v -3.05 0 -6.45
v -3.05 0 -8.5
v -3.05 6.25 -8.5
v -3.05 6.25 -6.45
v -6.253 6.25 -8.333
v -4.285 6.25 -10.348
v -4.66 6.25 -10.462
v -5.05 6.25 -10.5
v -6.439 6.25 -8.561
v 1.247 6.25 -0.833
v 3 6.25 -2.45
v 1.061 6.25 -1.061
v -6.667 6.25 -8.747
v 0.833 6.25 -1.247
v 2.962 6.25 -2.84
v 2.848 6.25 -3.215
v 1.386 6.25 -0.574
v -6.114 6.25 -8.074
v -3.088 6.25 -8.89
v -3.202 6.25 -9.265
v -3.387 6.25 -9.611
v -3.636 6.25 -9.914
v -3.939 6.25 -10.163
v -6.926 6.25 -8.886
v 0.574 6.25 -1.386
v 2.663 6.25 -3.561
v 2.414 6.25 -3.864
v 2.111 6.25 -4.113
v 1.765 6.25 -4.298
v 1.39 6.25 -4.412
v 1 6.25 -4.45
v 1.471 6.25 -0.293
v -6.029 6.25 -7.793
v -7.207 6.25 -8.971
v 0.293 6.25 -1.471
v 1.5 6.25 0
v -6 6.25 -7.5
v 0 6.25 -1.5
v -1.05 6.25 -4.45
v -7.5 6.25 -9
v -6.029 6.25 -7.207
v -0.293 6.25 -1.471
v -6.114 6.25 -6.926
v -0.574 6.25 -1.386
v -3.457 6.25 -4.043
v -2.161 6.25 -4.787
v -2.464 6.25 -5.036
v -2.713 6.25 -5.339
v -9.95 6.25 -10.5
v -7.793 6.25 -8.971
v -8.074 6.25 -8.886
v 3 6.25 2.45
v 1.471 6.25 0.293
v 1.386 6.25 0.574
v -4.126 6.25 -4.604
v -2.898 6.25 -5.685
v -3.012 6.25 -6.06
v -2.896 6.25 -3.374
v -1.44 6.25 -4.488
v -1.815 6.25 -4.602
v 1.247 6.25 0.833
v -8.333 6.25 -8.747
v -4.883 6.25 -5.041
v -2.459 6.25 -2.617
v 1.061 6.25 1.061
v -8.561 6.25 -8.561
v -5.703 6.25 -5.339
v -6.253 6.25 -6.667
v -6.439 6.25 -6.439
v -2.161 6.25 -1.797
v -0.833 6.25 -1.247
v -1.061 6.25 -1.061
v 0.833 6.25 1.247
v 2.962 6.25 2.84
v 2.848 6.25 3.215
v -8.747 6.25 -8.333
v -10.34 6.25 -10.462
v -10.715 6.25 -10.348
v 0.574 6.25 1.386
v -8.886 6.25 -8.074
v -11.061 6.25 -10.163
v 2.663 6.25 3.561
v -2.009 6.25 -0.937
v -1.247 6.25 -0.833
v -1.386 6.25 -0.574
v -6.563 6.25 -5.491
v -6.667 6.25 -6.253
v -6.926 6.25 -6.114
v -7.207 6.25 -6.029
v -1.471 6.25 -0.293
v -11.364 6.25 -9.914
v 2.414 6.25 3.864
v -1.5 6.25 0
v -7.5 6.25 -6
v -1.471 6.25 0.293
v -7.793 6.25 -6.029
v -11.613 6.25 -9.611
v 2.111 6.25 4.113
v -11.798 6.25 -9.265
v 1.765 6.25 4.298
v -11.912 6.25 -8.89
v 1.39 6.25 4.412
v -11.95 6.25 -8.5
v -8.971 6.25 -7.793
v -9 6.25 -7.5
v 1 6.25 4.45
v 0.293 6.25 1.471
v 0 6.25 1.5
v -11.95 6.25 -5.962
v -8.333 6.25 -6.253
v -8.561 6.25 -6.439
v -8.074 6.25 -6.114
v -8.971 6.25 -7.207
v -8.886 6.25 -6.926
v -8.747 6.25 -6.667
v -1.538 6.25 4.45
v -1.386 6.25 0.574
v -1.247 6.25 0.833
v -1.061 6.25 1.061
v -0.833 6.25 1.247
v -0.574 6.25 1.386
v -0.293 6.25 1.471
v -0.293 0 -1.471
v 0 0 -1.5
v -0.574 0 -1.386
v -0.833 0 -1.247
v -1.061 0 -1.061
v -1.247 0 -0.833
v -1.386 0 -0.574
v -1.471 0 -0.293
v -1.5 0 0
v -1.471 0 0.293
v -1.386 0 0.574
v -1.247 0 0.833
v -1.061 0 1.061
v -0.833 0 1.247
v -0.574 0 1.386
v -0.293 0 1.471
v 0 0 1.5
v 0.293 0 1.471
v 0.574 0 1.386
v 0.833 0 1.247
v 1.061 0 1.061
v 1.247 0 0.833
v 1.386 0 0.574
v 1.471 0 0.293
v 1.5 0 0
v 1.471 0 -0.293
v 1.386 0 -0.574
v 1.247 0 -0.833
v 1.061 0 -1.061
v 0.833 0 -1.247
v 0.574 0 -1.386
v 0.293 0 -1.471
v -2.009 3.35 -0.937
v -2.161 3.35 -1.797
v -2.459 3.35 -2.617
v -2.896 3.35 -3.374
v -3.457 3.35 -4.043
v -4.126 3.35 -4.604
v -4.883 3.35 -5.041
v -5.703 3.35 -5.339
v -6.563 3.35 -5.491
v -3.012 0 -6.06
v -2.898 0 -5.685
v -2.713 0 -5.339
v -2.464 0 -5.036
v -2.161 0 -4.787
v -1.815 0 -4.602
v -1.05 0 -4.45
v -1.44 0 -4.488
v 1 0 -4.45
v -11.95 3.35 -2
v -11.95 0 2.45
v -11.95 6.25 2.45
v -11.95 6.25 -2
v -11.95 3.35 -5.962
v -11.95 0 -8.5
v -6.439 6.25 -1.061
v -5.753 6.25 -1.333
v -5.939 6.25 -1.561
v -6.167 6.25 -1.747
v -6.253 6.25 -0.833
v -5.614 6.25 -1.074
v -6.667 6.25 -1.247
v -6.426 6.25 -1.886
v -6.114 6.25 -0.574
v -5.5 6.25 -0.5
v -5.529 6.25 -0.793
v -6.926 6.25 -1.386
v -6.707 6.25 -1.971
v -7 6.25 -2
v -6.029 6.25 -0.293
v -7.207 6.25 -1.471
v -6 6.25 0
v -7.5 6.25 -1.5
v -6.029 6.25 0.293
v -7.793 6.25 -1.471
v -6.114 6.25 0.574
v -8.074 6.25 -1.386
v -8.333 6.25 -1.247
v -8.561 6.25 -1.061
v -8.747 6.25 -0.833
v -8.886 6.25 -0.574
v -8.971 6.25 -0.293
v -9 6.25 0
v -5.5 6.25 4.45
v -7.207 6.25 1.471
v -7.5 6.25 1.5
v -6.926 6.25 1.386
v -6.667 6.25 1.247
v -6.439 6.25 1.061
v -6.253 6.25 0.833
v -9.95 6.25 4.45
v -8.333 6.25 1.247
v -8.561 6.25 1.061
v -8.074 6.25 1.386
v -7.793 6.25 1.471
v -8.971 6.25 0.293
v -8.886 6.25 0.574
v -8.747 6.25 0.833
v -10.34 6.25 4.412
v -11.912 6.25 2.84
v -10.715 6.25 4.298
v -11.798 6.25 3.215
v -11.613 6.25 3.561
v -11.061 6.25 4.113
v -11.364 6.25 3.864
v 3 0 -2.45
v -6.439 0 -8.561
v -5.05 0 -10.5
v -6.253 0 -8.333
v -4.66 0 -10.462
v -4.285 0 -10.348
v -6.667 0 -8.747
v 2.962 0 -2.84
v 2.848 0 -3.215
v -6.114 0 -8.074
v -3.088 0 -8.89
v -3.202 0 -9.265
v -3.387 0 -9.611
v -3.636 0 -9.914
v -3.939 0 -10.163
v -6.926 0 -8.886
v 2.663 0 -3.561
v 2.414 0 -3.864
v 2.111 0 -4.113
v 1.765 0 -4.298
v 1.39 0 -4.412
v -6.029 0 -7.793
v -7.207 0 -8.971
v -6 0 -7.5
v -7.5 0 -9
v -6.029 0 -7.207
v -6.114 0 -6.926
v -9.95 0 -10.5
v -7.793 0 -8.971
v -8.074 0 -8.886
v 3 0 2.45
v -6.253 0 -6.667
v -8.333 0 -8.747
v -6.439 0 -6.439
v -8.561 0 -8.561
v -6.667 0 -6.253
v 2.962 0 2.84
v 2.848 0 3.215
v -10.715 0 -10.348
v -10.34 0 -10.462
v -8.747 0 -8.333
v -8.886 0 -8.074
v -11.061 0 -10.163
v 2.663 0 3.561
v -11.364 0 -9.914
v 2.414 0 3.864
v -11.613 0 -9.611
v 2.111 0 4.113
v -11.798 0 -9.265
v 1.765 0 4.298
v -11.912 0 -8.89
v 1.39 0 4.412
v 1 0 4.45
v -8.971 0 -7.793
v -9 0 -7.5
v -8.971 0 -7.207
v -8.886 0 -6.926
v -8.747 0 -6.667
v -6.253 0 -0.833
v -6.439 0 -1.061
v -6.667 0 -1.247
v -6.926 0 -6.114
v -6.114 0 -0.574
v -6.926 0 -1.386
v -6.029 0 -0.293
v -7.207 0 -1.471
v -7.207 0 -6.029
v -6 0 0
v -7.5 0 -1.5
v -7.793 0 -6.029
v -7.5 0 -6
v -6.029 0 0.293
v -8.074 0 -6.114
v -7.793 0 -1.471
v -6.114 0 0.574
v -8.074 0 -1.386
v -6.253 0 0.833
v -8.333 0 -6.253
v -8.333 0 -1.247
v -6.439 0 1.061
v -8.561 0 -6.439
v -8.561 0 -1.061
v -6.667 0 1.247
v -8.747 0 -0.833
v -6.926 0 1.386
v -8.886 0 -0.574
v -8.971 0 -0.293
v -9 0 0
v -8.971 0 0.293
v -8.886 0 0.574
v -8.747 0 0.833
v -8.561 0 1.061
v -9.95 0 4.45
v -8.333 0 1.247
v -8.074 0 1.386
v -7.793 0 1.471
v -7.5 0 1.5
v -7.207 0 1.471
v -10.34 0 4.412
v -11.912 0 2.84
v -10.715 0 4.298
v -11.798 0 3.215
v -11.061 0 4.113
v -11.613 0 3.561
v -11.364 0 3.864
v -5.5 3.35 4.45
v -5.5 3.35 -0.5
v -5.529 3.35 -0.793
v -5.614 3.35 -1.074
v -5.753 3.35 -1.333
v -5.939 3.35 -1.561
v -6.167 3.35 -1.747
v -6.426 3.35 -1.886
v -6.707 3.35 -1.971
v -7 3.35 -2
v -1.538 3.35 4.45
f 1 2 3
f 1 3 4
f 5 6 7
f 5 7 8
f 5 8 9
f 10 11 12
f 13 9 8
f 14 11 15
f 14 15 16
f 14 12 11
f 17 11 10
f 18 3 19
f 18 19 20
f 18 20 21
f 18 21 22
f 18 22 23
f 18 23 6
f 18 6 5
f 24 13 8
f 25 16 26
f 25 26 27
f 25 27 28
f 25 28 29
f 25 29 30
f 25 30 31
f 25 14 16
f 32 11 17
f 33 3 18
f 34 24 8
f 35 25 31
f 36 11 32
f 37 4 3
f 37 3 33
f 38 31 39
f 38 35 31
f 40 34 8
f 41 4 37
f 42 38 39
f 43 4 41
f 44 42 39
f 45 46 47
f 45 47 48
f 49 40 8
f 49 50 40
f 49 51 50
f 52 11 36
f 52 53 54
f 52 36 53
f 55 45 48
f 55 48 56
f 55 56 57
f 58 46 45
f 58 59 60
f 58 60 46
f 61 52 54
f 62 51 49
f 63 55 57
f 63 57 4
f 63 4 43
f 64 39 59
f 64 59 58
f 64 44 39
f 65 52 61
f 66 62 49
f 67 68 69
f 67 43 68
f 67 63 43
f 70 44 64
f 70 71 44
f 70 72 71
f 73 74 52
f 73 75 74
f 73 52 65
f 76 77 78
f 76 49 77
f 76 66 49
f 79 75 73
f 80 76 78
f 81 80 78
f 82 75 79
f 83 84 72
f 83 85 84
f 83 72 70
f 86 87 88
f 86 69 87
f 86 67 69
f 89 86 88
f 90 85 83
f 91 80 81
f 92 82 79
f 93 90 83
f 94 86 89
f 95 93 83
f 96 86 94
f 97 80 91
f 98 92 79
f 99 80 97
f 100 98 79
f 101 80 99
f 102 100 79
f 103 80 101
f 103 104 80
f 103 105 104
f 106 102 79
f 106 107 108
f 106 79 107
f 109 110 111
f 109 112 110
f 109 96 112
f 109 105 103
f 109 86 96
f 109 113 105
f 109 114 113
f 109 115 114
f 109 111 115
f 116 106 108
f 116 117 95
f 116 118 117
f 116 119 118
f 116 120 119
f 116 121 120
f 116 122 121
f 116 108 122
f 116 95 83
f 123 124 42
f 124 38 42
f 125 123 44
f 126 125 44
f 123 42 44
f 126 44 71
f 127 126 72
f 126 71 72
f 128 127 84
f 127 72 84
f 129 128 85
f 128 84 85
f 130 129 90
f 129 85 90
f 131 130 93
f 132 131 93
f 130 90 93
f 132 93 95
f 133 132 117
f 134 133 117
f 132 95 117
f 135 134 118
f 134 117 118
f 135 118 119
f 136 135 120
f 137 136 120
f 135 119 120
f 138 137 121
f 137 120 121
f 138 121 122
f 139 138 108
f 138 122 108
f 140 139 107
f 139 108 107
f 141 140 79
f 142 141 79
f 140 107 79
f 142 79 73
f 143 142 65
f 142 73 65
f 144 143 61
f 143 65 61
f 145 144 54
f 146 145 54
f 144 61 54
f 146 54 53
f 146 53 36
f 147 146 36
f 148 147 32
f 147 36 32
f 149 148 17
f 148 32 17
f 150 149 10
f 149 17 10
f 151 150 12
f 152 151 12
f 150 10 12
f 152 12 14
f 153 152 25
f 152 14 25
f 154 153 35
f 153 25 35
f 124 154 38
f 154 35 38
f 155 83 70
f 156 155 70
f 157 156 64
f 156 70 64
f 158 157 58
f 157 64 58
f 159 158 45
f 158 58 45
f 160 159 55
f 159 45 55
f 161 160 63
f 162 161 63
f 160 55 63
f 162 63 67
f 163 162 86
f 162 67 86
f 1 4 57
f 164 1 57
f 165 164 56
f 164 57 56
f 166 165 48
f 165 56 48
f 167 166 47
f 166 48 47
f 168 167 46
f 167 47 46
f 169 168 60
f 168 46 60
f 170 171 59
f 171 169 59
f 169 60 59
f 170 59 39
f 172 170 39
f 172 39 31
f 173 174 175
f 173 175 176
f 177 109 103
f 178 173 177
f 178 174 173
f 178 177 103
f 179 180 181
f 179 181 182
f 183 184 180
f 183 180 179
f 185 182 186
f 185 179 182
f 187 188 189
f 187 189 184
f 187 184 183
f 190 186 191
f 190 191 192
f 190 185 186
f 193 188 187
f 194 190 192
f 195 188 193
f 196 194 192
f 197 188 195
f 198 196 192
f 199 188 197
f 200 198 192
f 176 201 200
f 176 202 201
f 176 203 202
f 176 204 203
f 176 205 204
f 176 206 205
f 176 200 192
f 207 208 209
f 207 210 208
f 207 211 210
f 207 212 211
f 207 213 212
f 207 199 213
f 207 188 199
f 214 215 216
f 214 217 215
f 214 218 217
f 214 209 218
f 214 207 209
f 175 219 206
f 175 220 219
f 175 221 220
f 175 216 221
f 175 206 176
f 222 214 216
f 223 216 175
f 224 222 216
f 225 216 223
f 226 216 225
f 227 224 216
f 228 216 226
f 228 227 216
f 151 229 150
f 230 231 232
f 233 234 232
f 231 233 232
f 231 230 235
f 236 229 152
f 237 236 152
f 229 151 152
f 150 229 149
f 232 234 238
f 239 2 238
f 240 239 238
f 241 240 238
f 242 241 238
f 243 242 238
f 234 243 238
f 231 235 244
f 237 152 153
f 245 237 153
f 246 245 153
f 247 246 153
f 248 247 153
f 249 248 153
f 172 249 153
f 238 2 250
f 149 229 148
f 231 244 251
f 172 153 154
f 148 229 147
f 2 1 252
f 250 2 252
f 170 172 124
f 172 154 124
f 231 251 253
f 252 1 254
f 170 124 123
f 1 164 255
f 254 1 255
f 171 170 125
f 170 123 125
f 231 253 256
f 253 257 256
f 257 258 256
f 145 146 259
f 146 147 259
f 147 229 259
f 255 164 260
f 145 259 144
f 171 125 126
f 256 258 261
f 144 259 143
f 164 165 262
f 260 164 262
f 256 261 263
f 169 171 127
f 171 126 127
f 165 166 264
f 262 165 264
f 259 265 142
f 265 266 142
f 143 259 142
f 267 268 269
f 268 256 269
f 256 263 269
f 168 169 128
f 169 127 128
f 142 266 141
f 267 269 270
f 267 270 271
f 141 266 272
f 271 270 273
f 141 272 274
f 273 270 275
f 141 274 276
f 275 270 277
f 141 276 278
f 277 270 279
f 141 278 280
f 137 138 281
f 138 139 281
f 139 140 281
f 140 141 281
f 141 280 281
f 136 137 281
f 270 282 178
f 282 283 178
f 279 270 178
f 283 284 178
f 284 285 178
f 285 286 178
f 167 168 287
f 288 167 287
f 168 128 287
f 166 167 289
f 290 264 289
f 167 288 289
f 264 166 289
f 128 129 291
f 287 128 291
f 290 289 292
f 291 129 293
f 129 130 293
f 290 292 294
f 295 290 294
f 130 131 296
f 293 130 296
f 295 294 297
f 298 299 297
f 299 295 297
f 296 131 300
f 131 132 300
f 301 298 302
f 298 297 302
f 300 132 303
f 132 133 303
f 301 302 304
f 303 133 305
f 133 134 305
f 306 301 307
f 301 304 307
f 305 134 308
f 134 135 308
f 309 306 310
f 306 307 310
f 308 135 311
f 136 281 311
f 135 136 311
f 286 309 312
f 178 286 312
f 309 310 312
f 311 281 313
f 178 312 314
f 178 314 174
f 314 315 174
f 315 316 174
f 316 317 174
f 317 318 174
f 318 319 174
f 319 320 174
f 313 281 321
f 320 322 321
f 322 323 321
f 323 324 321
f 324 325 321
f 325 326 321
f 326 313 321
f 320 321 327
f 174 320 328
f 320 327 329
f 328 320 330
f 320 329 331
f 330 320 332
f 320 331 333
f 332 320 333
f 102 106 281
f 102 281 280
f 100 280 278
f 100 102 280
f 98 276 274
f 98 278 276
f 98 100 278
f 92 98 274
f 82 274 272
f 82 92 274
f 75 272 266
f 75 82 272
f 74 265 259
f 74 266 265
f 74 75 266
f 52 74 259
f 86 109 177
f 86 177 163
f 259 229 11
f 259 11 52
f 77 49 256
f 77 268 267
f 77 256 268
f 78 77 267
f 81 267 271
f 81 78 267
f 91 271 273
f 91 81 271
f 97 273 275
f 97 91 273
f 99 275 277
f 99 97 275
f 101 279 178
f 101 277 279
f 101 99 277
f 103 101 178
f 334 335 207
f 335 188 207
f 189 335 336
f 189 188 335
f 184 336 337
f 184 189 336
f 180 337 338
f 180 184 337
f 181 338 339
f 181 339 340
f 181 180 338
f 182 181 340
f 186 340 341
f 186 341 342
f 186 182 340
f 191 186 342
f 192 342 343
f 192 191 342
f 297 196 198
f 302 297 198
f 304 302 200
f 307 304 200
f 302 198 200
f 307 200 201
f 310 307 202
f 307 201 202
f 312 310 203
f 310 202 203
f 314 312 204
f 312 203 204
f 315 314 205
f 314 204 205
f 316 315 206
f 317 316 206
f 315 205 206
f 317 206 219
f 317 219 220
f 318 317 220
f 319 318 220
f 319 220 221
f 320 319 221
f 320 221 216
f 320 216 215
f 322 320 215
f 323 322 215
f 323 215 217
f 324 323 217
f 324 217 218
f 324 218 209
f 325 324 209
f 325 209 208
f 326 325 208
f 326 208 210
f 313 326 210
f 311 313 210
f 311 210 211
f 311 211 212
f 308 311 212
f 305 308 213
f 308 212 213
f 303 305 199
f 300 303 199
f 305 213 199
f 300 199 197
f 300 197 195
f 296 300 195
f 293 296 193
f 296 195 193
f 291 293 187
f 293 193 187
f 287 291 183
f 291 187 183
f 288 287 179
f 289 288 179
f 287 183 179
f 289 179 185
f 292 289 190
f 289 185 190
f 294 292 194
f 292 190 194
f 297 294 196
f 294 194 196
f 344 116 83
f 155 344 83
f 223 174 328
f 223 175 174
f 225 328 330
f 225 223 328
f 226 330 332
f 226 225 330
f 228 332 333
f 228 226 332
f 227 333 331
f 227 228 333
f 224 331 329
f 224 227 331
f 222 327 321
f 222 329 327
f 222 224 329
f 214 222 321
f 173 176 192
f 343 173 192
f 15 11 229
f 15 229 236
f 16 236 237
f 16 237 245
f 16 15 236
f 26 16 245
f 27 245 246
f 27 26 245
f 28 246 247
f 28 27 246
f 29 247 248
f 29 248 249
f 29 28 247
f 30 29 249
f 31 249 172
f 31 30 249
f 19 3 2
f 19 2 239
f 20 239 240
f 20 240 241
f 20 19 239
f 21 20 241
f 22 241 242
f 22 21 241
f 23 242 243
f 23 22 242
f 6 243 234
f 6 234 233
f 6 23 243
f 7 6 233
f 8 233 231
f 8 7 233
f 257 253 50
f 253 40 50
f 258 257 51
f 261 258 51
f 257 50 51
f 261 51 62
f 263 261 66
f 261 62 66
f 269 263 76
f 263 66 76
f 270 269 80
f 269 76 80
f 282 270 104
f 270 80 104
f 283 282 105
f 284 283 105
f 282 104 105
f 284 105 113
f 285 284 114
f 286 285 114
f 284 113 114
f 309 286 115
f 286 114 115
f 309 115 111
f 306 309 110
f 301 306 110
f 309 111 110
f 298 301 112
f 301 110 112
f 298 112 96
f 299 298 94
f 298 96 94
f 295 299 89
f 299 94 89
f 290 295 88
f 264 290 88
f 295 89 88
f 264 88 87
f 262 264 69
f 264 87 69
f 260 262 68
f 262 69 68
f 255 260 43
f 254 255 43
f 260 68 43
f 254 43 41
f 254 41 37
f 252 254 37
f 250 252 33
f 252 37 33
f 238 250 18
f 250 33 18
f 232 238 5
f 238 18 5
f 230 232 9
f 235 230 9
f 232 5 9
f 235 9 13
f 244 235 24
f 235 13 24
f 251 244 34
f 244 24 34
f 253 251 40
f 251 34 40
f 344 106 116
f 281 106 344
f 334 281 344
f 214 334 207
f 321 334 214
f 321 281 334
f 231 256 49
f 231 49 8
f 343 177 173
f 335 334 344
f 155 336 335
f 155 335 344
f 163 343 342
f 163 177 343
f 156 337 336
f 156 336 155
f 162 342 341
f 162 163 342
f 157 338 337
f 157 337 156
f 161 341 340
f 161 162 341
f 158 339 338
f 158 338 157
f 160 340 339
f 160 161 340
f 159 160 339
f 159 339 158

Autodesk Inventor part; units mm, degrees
ref_plane "YZ Plane" through (0, 0, 0) normal (1, 0, 0) x (0, 1, 0)
ref_plane "XZ Plane" through (0, 0, 0) normal (0, 1, 0) x (-1, 0, 0)
ref_plane "XY Plane" through (0, 0, 0) normal (0, 0, 1) x (1, 0, 0)
sketch "Sketch1" plane through (0, 0, 0) normal (0, 1, 0) x (-1, 0, 0)
  line L0 (0, 0) -> (7.5, 0) construction
  line L1 (7.5, 0) -> (7.5, -7.5) construction
  line L2 (0, 0) -> (-3, 0) construction
  line L3 (-3, -4.45) -> (-3, 4.45)
  line L4 (-3, 4.45) -> (11.95, 4.45)
  line L5 (11.95, 4.45) -> (11.95, -10.5)
  line L6 (11.95, -10.5) -> (3.05, -10.5)
  line L7 (3.05, -10.5) -> (3.05, -4.45)
  line L8 (3.05, -4.45) -> (-3, -4.45)
  line L9 (7.5, -7.5) -> (7.5, -10.5) construction
  dimension "d0" = 7.5
  dimension "d1" = 7.5
  dimension "d2" = 8.9
  dimension "d3" = 3
extrude "Extrusion1" add sketch "Sketch1" along normal blind 6.25
hole "Hole1" at (0, 0, 0) at (-7.5, 0, 0) at (-7.5, 0, -7.5) direction (0, 1, 0) diameter 3 end through all
sketch "Sketch2" plane through (0, 6.25, 0) normal (0, 1, 0) x (1, 0, 0)
  circle A0 centre (-7.5, 0) radius 1.5 projected
  circle A1 centre (0, 0) radius 1.5 construction
  circle A2 centre (-7.5, 7.5) radius 1.5 projected
  line L0 (3, -4.45) -> (3, 4.45) construction
  line L1 (3, 4.45) -> (-3.05, 4.45) construction
  line L2 (-3.05, 4.45) -> (-3.05, 10.5) construction
  line L3 (-3.05, 10.5) -> (-11.95, 10.5) construction
  line L4 (-11.95, 10.5) -> (-11.95, -4.45) construction
  line L5 (-11.95, -4.45) -> (3, -4.45) construction
  line L6 (-11.95, -4.45) -> (-11.95, 10.5) projected
  line L7 (-11.95, 2) -> (-7, 2)
  line L8 (-5.5, 2) -> (-5.5, 0.5) construction
  line L9 (-11.95, -4.45) -> (3, -4.45) construction
  line L10 (-3.05, 4.45) -> (3, 4.45) construction
  line L11 (-7.5, 0) -> (-7.5, 2) construction
  line L12 (-7.5, 0) -> (-5.5, 0) construction
  line L13 (-3.05, 4.45) -> (-3.05, 10.5) construction
  line L14 (-3.05, 10.5) -> (-3.05, 4.45) construction
  line L15 (-1.5378, -4.45) -> (-5.5, -4.45)
  line L16 (-11.95, 2) -> (-11.95, 5.9622)
  line L17 (-11.95, 10.5) -> (-11.95, -4.45) projected
  line L18 (-11.95, 5.9622) -> (-6.5633, 5.4909)
  line L19 (-1.5378, -4.45) -> (-2.0091, 0.9367)
  circle A3 centre (-7, 0.5) radius 1.5
  line L20 (-7, 2) -> (-5.5, 2) construction
  line L21 (-5.5, 0.5) -> (-5.5, -4.45)
  arc A4 (-2.0091, 0.9367) -> (-6.5633, 5.4909) centre (-7, 0.5) ccw
  dimension "d14" = 2
  dimension "d18" = 5
  dimension "d19" = 5
  dimension "d21" = 3
  dimension "d22" = 5.01
extrude "MontageEnForce" cut sketch "Sketch2" against normal blind 2.9 contours L7 L6 L18 A4 L19 L15 L21 A3
fillet "Fillet1" radius 2 6 edges at (-3.05, 3.125, -4.45) (-11.95, 3.125, 4.45) (-3.05, 3.125, -10.5) (-11.95, 3.125, -10.5) (3, 3.125, 4.45) (3, 3.125, -4.45)
ref_plane "Work Plane1" through (0, 4.8, 0) normal (0, 1, 0) x (1, 0, 0)
sketch "Sketch4" plane through (0, 6.25, 0) normal (0, 1, 0) x (1, 0, 0)
  circle A0 centre (-7.5, 0) radius 1.5 projected
  circle A1 centre (-7.5, 7.5) radius 1.5 projected
  circle A2 centre (0, 0) radius 1.5 projected
ref_plane "Work Plane5" through (-7.5, 6.25, 0) normal (-1, 0, 0) x (0, 0, 1)
ref_plane "Work Plane6" through (0, 6.25, 0) normal (-1, 0, 0) x (0, 0, 1)
ref_plane "Work Plane7" through (-7.5, 6.25, 0) normal (0, 0, 1) x (1, 0, 0)
ref_plane "Work Plane8" through (-7.5, 6.25, -7.5) normal (0, 0, 1) x (1, 0, 0)
ref_plane "Work Plane2" through (-3.75, 6.25, 0) normal (-1, 0, 0) x (0, 0, 1)
ref_plane "Work Plane3" through (-7.5, 6.25, -3.75) normal (0, 0, 1) x (1, 0, 0)
equation "\"d0\" = side_2_corner"
equation "\"d1\" = side_2_corner"
equation "\"d2\" = width"
equation "\"d3\" = hole_2_border"
equation "\"d4\" = fix_thickness"
equation "\"d14\" = wire_2_corner"
equation "\"d18\" = angle_tol"
equation "\"d19\" = angle_tol"
equation "\"d21\" = 2 * wire_corner_fillet"
equation "\"d22\" = wire_corner_margin + wire_diameter + wire_corner_fillet"
equation "\"fix_thickness\" = 6.25"
equation "\"wire_diameter\" = 3"
equation "\"back_fix_width\" = 1"
equation "\"side_2_corner\" = piano_wire_holes_spacing"
equation "\"wire_2_corner\" = 2"
equation "\"angle_tol\" = 5deg"
equation "\"wire_corner_margin\" = 0.51"
equation "\"wire_corner_fillet\" = 1.5"
equation "\"hole_2_border\" = 3"
equation "\"width\" = 8.9"
equation "\"piano_wire_holes_spacing\" = 7.5"
properties part number "piano_wire_back_fixation"
